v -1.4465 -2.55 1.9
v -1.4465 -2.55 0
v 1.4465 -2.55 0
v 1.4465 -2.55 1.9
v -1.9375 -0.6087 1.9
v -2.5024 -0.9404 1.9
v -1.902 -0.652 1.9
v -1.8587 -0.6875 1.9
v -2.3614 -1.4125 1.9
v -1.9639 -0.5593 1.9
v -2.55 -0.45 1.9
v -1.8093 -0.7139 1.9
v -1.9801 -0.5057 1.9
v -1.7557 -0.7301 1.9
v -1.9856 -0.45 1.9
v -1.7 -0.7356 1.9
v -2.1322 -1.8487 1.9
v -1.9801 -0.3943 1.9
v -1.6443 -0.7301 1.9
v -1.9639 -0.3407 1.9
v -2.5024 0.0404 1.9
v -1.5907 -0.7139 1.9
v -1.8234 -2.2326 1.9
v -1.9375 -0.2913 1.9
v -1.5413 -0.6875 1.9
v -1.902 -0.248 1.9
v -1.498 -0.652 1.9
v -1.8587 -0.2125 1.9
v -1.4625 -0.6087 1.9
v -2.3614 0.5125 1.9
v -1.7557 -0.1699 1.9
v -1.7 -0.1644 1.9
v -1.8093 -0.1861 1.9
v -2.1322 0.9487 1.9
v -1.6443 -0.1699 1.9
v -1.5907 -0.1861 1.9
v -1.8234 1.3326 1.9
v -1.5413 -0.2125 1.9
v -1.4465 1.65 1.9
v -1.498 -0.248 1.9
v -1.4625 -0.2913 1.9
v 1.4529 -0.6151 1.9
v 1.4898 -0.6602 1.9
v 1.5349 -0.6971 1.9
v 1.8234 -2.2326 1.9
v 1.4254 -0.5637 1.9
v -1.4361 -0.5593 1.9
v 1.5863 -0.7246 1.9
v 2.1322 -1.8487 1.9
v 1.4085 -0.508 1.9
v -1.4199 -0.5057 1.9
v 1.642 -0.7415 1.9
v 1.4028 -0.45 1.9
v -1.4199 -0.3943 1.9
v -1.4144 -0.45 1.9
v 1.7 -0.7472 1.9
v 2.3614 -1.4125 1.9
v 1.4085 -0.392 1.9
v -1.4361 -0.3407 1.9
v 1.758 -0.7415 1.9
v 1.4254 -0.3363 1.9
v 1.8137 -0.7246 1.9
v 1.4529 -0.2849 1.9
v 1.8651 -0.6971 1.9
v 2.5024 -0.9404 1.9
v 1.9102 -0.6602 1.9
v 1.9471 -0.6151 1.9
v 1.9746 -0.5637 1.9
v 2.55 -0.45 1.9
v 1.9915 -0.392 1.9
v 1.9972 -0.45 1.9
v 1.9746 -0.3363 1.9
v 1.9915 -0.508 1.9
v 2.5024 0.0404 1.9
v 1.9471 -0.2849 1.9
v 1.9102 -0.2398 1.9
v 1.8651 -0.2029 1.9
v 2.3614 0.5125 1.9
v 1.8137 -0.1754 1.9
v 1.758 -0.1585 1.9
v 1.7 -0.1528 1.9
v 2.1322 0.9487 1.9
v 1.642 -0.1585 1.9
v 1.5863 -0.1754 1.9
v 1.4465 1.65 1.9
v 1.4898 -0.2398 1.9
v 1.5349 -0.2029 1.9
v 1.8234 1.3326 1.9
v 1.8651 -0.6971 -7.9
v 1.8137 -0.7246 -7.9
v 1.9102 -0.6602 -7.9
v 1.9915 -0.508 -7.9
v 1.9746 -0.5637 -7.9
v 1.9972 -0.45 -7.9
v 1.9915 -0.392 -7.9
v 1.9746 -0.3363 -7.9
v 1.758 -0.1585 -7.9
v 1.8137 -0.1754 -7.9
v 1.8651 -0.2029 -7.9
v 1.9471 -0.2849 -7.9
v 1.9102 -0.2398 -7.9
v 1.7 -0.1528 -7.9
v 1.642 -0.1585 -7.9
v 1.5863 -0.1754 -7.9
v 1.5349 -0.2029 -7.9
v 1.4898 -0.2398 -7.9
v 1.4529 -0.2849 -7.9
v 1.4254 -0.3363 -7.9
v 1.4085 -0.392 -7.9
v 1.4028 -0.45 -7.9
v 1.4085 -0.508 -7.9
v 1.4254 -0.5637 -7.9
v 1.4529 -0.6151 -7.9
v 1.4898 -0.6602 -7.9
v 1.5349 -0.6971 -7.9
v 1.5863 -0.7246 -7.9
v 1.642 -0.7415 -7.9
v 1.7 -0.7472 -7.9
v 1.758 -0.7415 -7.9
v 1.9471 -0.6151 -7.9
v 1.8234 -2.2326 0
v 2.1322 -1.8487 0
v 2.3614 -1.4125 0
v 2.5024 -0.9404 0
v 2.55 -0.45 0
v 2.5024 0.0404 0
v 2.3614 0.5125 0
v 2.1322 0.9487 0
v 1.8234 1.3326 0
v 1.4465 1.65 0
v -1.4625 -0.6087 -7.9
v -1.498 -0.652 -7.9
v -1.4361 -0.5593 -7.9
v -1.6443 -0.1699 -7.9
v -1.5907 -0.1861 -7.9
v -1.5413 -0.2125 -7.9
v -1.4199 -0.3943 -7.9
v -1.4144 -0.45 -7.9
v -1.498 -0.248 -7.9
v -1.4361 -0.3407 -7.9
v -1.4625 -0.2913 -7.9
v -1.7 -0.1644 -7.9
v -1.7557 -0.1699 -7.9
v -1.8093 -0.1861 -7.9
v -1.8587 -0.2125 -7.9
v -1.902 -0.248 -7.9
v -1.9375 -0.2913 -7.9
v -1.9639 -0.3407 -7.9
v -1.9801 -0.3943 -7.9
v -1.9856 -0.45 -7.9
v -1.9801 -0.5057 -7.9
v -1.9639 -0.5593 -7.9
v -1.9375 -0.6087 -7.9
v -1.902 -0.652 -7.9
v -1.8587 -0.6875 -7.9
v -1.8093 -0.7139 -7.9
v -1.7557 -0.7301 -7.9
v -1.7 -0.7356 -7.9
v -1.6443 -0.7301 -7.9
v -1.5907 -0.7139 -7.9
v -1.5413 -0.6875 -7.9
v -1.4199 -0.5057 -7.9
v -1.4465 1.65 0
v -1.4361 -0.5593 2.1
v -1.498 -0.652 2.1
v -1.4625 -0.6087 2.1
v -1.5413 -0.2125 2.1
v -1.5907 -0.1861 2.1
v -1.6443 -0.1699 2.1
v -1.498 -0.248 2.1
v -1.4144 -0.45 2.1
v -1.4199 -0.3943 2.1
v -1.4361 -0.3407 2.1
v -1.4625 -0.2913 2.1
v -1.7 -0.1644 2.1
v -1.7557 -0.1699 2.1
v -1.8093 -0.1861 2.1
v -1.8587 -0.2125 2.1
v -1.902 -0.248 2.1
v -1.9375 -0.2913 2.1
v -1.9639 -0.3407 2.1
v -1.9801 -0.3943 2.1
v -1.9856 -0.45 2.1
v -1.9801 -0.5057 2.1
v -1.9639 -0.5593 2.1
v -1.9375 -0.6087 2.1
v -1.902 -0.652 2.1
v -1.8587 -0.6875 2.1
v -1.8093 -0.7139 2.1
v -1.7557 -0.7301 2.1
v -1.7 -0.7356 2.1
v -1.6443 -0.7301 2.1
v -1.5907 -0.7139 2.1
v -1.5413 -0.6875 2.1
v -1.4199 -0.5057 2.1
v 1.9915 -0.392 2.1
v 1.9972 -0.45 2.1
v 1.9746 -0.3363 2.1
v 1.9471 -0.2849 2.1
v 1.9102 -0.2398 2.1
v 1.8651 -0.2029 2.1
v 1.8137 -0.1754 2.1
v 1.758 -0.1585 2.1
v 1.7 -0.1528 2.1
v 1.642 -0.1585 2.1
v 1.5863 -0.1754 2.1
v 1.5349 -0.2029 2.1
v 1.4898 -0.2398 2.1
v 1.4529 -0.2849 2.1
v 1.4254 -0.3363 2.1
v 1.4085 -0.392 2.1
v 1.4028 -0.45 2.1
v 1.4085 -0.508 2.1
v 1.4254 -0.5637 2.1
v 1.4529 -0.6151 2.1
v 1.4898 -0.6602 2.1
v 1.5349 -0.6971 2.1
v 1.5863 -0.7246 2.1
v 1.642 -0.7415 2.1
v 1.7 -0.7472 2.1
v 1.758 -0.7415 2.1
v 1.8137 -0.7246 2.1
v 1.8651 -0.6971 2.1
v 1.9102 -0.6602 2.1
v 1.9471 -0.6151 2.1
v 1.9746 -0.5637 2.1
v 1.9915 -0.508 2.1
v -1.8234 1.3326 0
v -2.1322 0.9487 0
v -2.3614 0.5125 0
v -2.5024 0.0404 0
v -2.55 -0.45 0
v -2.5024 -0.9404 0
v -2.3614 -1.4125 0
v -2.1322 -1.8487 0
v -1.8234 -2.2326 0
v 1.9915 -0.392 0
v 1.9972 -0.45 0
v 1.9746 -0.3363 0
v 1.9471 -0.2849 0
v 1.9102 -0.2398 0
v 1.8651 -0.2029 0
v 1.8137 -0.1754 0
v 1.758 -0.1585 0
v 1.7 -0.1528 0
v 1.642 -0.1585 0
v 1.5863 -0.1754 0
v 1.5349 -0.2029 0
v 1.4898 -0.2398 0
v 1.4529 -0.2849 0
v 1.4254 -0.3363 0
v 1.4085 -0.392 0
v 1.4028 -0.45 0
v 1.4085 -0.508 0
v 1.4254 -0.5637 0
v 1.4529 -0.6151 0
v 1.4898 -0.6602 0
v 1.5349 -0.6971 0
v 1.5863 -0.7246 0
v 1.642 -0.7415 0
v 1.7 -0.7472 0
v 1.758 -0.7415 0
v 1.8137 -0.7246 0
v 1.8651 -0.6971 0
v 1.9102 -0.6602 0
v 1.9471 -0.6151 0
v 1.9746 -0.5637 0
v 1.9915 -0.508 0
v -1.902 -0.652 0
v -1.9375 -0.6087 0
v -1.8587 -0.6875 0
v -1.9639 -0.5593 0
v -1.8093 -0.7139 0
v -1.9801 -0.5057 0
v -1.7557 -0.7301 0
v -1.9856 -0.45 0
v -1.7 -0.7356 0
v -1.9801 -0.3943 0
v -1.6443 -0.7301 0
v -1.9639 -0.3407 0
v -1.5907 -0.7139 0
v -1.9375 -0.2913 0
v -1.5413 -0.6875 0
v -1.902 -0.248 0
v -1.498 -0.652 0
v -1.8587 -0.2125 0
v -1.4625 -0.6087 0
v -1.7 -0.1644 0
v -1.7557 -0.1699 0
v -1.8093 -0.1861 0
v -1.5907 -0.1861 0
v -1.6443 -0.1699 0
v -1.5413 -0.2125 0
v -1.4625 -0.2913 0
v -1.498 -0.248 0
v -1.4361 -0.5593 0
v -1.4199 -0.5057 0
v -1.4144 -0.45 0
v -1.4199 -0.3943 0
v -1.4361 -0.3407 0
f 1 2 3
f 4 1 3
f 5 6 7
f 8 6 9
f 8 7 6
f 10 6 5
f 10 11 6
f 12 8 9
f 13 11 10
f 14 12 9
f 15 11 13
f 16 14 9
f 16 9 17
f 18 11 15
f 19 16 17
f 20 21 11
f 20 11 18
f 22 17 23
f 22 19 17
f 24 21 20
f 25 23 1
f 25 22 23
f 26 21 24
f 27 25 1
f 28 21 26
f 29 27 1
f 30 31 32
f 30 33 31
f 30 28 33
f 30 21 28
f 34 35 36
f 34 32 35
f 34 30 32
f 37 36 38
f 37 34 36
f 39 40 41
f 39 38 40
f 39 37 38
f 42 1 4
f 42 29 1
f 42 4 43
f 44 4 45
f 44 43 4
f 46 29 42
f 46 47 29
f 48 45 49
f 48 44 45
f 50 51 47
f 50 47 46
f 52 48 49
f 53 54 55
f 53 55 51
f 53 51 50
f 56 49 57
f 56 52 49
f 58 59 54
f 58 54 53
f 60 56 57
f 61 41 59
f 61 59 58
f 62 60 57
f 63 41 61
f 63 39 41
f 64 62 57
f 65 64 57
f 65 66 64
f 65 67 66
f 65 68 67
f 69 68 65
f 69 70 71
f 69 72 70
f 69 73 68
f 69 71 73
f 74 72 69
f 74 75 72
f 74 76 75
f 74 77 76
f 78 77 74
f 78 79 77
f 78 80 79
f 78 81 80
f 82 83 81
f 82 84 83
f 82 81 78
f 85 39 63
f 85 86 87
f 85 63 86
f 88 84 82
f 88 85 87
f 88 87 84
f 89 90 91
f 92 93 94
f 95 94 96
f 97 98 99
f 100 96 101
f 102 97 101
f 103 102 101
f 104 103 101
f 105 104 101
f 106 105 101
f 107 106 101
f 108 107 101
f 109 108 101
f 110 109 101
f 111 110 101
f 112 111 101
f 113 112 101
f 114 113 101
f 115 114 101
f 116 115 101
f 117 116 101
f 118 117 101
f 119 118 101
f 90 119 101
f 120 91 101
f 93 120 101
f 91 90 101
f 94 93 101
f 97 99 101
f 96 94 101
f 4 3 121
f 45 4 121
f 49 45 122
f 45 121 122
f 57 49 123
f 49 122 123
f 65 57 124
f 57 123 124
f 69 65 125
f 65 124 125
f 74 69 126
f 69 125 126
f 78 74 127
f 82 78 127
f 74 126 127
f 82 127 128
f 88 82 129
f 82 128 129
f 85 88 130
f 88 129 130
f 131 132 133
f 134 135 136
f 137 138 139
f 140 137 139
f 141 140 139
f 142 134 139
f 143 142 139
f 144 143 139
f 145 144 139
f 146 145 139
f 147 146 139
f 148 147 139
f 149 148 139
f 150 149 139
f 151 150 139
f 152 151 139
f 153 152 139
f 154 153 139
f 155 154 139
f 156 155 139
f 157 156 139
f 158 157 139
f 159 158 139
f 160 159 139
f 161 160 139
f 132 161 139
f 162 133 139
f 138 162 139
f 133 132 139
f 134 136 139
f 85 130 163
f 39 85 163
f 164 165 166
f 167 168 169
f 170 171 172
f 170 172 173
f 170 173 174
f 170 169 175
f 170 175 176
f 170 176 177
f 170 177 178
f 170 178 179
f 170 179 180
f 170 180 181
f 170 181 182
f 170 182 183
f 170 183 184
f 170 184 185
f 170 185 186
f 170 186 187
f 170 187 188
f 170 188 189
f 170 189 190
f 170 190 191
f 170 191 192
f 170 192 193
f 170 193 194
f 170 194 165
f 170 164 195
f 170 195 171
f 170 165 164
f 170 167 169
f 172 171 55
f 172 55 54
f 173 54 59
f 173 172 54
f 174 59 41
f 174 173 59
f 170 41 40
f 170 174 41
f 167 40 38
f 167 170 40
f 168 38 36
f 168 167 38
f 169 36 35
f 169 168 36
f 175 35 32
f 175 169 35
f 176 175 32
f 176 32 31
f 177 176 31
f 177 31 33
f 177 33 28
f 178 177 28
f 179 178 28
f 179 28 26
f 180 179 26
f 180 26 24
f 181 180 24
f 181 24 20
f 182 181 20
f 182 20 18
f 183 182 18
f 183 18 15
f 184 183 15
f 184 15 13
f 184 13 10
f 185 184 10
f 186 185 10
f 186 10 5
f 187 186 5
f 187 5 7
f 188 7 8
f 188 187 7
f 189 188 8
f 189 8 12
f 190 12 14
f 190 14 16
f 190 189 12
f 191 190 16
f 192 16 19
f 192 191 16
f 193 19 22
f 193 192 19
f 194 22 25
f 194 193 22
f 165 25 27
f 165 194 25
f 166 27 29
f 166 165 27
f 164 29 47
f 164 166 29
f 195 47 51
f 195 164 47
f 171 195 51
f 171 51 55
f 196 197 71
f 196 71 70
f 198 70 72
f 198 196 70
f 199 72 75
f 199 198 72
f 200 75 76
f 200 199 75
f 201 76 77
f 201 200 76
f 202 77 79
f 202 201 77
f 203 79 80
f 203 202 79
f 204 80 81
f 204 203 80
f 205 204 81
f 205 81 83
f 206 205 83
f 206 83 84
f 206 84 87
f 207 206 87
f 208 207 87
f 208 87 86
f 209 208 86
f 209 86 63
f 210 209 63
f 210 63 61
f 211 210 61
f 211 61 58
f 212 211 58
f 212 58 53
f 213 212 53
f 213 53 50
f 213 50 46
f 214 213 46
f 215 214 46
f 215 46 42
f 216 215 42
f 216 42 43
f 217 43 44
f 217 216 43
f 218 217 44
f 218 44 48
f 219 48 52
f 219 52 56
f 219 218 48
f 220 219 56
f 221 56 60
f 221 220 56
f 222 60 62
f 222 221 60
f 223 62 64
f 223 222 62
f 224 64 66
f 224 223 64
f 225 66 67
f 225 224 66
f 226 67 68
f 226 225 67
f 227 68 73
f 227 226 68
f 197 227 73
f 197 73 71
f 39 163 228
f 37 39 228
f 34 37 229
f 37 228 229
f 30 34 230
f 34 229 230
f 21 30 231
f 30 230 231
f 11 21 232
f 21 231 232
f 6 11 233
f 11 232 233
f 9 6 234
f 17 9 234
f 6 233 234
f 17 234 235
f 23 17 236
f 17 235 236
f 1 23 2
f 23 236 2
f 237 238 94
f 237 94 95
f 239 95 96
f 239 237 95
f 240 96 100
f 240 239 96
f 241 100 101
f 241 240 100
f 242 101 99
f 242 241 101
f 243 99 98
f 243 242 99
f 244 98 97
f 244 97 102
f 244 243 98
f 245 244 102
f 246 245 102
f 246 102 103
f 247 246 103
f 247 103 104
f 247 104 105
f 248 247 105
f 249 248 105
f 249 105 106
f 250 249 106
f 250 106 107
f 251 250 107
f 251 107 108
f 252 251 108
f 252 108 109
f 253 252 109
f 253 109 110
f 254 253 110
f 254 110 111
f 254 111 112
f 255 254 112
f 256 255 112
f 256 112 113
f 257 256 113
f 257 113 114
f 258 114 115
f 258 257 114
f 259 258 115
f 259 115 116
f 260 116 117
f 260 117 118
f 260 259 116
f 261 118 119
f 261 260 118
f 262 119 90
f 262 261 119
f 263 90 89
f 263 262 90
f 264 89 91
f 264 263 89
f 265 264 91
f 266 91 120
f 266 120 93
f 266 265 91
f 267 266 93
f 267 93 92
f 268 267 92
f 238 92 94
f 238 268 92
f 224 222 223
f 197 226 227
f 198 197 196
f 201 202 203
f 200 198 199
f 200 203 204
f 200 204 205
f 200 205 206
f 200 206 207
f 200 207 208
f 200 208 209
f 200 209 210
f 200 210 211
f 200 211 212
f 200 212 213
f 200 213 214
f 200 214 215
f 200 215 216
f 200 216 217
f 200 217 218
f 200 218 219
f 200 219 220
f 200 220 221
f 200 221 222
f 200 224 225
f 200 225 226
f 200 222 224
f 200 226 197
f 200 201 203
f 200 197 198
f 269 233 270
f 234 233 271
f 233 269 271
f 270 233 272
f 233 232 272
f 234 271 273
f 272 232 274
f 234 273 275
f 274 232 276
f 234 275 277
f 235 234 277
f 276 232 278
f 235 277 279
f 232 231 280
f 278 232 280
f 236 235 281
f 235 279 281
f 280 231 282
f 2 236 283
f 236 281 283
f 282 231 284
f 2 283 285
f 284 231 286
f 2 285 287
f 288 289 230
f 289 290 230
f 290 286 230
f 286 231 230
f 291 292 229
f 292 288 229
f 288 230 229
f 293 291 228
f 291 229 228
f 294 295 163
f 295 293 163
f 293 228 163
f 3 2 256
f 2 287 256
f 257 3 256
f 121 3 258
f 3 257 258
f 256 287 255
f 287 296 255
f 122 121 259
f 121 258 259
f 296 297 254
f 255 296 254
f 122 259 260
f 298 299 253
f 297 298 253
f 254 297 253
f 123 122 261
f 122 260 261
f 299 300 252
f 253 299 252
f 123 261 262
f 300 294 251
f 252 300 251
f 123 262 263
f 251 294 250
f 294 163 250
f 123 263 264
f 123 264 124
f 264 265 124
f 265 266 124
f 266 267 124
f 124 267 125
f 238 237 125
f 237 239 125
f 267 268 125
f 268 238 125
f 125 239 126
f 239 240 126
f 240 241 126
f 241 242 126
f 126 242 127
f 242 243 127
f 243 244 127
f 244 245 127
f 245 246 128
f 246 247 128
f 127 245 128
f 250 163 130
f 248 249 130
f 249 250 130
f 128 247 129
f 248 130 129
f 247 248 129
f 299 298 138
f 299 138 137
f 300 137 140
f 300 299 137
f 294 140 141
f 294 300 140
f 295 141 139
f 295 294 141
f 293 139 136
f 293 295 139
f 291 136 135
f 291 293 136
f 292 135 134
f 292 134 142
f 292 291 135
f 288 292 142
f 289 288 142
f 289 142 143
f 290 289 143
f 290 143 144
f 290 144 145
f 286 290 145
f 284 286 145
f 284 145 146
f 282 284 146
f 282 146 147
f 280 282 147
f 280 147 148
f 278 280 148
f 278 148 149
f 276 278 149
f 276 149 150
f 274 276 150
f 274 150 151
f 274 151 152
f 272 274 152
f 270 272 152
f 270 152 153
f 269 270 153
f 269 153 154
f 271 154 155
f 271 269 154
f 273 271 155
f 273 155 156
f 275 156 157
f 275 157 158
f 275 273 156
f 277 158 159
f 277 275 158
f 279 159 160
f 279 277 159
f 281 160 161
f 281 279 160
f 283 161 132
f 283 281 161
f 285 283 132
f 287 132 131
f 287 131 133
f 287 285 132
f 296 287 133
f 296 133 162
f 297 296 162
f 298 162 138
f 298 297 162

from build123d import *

# Parameters (mm, degrees)
RESSALTO_EXTRUS_O1_DEPTH = 1.9
ESBO_O3_R                = 0.297205441
ESBO_O3_R_2              = 0.285630525
RESSALTO_EXTRUS_O2_DEPTH = 10


with BuildPart() as part:
    # Esboço2 → Ressalto-extrusão1 (new body)
    with BuildSketch(Plane.XY):
        with BuildLine():
            Line((-1.446547614, -2.55), (1.446547614, -2.55))
            ThreePointArc((1.446547614, -2.55), (2.55, -0.45), (1.446547614, 1.65))
            Line((1.446547614, 1.65), (-1.446547614, 1.65))
            ThreePointArc((-1.446547614, 1.65), (-2.55, -0.45), (-1.446547614, -2.55))
        make_face()
    extrude(amount=RESSALTO_EXTRUS_O1_DEPTH)

    # Esboço3 → Ressalto-extrusão2 (add)
    with BuildSketch(Plane.XY.offset(2.1)):
        with Locations((1.7, -0.45)):
            Circle(ESBO_O3_R)
        with Locations((-1.7, -0.45)):
            Circle(ESBO_O3_R_2)
    extrude(amount=-RESSALTO_EXTRUS_O2_DEPTH)


solid = part.part
